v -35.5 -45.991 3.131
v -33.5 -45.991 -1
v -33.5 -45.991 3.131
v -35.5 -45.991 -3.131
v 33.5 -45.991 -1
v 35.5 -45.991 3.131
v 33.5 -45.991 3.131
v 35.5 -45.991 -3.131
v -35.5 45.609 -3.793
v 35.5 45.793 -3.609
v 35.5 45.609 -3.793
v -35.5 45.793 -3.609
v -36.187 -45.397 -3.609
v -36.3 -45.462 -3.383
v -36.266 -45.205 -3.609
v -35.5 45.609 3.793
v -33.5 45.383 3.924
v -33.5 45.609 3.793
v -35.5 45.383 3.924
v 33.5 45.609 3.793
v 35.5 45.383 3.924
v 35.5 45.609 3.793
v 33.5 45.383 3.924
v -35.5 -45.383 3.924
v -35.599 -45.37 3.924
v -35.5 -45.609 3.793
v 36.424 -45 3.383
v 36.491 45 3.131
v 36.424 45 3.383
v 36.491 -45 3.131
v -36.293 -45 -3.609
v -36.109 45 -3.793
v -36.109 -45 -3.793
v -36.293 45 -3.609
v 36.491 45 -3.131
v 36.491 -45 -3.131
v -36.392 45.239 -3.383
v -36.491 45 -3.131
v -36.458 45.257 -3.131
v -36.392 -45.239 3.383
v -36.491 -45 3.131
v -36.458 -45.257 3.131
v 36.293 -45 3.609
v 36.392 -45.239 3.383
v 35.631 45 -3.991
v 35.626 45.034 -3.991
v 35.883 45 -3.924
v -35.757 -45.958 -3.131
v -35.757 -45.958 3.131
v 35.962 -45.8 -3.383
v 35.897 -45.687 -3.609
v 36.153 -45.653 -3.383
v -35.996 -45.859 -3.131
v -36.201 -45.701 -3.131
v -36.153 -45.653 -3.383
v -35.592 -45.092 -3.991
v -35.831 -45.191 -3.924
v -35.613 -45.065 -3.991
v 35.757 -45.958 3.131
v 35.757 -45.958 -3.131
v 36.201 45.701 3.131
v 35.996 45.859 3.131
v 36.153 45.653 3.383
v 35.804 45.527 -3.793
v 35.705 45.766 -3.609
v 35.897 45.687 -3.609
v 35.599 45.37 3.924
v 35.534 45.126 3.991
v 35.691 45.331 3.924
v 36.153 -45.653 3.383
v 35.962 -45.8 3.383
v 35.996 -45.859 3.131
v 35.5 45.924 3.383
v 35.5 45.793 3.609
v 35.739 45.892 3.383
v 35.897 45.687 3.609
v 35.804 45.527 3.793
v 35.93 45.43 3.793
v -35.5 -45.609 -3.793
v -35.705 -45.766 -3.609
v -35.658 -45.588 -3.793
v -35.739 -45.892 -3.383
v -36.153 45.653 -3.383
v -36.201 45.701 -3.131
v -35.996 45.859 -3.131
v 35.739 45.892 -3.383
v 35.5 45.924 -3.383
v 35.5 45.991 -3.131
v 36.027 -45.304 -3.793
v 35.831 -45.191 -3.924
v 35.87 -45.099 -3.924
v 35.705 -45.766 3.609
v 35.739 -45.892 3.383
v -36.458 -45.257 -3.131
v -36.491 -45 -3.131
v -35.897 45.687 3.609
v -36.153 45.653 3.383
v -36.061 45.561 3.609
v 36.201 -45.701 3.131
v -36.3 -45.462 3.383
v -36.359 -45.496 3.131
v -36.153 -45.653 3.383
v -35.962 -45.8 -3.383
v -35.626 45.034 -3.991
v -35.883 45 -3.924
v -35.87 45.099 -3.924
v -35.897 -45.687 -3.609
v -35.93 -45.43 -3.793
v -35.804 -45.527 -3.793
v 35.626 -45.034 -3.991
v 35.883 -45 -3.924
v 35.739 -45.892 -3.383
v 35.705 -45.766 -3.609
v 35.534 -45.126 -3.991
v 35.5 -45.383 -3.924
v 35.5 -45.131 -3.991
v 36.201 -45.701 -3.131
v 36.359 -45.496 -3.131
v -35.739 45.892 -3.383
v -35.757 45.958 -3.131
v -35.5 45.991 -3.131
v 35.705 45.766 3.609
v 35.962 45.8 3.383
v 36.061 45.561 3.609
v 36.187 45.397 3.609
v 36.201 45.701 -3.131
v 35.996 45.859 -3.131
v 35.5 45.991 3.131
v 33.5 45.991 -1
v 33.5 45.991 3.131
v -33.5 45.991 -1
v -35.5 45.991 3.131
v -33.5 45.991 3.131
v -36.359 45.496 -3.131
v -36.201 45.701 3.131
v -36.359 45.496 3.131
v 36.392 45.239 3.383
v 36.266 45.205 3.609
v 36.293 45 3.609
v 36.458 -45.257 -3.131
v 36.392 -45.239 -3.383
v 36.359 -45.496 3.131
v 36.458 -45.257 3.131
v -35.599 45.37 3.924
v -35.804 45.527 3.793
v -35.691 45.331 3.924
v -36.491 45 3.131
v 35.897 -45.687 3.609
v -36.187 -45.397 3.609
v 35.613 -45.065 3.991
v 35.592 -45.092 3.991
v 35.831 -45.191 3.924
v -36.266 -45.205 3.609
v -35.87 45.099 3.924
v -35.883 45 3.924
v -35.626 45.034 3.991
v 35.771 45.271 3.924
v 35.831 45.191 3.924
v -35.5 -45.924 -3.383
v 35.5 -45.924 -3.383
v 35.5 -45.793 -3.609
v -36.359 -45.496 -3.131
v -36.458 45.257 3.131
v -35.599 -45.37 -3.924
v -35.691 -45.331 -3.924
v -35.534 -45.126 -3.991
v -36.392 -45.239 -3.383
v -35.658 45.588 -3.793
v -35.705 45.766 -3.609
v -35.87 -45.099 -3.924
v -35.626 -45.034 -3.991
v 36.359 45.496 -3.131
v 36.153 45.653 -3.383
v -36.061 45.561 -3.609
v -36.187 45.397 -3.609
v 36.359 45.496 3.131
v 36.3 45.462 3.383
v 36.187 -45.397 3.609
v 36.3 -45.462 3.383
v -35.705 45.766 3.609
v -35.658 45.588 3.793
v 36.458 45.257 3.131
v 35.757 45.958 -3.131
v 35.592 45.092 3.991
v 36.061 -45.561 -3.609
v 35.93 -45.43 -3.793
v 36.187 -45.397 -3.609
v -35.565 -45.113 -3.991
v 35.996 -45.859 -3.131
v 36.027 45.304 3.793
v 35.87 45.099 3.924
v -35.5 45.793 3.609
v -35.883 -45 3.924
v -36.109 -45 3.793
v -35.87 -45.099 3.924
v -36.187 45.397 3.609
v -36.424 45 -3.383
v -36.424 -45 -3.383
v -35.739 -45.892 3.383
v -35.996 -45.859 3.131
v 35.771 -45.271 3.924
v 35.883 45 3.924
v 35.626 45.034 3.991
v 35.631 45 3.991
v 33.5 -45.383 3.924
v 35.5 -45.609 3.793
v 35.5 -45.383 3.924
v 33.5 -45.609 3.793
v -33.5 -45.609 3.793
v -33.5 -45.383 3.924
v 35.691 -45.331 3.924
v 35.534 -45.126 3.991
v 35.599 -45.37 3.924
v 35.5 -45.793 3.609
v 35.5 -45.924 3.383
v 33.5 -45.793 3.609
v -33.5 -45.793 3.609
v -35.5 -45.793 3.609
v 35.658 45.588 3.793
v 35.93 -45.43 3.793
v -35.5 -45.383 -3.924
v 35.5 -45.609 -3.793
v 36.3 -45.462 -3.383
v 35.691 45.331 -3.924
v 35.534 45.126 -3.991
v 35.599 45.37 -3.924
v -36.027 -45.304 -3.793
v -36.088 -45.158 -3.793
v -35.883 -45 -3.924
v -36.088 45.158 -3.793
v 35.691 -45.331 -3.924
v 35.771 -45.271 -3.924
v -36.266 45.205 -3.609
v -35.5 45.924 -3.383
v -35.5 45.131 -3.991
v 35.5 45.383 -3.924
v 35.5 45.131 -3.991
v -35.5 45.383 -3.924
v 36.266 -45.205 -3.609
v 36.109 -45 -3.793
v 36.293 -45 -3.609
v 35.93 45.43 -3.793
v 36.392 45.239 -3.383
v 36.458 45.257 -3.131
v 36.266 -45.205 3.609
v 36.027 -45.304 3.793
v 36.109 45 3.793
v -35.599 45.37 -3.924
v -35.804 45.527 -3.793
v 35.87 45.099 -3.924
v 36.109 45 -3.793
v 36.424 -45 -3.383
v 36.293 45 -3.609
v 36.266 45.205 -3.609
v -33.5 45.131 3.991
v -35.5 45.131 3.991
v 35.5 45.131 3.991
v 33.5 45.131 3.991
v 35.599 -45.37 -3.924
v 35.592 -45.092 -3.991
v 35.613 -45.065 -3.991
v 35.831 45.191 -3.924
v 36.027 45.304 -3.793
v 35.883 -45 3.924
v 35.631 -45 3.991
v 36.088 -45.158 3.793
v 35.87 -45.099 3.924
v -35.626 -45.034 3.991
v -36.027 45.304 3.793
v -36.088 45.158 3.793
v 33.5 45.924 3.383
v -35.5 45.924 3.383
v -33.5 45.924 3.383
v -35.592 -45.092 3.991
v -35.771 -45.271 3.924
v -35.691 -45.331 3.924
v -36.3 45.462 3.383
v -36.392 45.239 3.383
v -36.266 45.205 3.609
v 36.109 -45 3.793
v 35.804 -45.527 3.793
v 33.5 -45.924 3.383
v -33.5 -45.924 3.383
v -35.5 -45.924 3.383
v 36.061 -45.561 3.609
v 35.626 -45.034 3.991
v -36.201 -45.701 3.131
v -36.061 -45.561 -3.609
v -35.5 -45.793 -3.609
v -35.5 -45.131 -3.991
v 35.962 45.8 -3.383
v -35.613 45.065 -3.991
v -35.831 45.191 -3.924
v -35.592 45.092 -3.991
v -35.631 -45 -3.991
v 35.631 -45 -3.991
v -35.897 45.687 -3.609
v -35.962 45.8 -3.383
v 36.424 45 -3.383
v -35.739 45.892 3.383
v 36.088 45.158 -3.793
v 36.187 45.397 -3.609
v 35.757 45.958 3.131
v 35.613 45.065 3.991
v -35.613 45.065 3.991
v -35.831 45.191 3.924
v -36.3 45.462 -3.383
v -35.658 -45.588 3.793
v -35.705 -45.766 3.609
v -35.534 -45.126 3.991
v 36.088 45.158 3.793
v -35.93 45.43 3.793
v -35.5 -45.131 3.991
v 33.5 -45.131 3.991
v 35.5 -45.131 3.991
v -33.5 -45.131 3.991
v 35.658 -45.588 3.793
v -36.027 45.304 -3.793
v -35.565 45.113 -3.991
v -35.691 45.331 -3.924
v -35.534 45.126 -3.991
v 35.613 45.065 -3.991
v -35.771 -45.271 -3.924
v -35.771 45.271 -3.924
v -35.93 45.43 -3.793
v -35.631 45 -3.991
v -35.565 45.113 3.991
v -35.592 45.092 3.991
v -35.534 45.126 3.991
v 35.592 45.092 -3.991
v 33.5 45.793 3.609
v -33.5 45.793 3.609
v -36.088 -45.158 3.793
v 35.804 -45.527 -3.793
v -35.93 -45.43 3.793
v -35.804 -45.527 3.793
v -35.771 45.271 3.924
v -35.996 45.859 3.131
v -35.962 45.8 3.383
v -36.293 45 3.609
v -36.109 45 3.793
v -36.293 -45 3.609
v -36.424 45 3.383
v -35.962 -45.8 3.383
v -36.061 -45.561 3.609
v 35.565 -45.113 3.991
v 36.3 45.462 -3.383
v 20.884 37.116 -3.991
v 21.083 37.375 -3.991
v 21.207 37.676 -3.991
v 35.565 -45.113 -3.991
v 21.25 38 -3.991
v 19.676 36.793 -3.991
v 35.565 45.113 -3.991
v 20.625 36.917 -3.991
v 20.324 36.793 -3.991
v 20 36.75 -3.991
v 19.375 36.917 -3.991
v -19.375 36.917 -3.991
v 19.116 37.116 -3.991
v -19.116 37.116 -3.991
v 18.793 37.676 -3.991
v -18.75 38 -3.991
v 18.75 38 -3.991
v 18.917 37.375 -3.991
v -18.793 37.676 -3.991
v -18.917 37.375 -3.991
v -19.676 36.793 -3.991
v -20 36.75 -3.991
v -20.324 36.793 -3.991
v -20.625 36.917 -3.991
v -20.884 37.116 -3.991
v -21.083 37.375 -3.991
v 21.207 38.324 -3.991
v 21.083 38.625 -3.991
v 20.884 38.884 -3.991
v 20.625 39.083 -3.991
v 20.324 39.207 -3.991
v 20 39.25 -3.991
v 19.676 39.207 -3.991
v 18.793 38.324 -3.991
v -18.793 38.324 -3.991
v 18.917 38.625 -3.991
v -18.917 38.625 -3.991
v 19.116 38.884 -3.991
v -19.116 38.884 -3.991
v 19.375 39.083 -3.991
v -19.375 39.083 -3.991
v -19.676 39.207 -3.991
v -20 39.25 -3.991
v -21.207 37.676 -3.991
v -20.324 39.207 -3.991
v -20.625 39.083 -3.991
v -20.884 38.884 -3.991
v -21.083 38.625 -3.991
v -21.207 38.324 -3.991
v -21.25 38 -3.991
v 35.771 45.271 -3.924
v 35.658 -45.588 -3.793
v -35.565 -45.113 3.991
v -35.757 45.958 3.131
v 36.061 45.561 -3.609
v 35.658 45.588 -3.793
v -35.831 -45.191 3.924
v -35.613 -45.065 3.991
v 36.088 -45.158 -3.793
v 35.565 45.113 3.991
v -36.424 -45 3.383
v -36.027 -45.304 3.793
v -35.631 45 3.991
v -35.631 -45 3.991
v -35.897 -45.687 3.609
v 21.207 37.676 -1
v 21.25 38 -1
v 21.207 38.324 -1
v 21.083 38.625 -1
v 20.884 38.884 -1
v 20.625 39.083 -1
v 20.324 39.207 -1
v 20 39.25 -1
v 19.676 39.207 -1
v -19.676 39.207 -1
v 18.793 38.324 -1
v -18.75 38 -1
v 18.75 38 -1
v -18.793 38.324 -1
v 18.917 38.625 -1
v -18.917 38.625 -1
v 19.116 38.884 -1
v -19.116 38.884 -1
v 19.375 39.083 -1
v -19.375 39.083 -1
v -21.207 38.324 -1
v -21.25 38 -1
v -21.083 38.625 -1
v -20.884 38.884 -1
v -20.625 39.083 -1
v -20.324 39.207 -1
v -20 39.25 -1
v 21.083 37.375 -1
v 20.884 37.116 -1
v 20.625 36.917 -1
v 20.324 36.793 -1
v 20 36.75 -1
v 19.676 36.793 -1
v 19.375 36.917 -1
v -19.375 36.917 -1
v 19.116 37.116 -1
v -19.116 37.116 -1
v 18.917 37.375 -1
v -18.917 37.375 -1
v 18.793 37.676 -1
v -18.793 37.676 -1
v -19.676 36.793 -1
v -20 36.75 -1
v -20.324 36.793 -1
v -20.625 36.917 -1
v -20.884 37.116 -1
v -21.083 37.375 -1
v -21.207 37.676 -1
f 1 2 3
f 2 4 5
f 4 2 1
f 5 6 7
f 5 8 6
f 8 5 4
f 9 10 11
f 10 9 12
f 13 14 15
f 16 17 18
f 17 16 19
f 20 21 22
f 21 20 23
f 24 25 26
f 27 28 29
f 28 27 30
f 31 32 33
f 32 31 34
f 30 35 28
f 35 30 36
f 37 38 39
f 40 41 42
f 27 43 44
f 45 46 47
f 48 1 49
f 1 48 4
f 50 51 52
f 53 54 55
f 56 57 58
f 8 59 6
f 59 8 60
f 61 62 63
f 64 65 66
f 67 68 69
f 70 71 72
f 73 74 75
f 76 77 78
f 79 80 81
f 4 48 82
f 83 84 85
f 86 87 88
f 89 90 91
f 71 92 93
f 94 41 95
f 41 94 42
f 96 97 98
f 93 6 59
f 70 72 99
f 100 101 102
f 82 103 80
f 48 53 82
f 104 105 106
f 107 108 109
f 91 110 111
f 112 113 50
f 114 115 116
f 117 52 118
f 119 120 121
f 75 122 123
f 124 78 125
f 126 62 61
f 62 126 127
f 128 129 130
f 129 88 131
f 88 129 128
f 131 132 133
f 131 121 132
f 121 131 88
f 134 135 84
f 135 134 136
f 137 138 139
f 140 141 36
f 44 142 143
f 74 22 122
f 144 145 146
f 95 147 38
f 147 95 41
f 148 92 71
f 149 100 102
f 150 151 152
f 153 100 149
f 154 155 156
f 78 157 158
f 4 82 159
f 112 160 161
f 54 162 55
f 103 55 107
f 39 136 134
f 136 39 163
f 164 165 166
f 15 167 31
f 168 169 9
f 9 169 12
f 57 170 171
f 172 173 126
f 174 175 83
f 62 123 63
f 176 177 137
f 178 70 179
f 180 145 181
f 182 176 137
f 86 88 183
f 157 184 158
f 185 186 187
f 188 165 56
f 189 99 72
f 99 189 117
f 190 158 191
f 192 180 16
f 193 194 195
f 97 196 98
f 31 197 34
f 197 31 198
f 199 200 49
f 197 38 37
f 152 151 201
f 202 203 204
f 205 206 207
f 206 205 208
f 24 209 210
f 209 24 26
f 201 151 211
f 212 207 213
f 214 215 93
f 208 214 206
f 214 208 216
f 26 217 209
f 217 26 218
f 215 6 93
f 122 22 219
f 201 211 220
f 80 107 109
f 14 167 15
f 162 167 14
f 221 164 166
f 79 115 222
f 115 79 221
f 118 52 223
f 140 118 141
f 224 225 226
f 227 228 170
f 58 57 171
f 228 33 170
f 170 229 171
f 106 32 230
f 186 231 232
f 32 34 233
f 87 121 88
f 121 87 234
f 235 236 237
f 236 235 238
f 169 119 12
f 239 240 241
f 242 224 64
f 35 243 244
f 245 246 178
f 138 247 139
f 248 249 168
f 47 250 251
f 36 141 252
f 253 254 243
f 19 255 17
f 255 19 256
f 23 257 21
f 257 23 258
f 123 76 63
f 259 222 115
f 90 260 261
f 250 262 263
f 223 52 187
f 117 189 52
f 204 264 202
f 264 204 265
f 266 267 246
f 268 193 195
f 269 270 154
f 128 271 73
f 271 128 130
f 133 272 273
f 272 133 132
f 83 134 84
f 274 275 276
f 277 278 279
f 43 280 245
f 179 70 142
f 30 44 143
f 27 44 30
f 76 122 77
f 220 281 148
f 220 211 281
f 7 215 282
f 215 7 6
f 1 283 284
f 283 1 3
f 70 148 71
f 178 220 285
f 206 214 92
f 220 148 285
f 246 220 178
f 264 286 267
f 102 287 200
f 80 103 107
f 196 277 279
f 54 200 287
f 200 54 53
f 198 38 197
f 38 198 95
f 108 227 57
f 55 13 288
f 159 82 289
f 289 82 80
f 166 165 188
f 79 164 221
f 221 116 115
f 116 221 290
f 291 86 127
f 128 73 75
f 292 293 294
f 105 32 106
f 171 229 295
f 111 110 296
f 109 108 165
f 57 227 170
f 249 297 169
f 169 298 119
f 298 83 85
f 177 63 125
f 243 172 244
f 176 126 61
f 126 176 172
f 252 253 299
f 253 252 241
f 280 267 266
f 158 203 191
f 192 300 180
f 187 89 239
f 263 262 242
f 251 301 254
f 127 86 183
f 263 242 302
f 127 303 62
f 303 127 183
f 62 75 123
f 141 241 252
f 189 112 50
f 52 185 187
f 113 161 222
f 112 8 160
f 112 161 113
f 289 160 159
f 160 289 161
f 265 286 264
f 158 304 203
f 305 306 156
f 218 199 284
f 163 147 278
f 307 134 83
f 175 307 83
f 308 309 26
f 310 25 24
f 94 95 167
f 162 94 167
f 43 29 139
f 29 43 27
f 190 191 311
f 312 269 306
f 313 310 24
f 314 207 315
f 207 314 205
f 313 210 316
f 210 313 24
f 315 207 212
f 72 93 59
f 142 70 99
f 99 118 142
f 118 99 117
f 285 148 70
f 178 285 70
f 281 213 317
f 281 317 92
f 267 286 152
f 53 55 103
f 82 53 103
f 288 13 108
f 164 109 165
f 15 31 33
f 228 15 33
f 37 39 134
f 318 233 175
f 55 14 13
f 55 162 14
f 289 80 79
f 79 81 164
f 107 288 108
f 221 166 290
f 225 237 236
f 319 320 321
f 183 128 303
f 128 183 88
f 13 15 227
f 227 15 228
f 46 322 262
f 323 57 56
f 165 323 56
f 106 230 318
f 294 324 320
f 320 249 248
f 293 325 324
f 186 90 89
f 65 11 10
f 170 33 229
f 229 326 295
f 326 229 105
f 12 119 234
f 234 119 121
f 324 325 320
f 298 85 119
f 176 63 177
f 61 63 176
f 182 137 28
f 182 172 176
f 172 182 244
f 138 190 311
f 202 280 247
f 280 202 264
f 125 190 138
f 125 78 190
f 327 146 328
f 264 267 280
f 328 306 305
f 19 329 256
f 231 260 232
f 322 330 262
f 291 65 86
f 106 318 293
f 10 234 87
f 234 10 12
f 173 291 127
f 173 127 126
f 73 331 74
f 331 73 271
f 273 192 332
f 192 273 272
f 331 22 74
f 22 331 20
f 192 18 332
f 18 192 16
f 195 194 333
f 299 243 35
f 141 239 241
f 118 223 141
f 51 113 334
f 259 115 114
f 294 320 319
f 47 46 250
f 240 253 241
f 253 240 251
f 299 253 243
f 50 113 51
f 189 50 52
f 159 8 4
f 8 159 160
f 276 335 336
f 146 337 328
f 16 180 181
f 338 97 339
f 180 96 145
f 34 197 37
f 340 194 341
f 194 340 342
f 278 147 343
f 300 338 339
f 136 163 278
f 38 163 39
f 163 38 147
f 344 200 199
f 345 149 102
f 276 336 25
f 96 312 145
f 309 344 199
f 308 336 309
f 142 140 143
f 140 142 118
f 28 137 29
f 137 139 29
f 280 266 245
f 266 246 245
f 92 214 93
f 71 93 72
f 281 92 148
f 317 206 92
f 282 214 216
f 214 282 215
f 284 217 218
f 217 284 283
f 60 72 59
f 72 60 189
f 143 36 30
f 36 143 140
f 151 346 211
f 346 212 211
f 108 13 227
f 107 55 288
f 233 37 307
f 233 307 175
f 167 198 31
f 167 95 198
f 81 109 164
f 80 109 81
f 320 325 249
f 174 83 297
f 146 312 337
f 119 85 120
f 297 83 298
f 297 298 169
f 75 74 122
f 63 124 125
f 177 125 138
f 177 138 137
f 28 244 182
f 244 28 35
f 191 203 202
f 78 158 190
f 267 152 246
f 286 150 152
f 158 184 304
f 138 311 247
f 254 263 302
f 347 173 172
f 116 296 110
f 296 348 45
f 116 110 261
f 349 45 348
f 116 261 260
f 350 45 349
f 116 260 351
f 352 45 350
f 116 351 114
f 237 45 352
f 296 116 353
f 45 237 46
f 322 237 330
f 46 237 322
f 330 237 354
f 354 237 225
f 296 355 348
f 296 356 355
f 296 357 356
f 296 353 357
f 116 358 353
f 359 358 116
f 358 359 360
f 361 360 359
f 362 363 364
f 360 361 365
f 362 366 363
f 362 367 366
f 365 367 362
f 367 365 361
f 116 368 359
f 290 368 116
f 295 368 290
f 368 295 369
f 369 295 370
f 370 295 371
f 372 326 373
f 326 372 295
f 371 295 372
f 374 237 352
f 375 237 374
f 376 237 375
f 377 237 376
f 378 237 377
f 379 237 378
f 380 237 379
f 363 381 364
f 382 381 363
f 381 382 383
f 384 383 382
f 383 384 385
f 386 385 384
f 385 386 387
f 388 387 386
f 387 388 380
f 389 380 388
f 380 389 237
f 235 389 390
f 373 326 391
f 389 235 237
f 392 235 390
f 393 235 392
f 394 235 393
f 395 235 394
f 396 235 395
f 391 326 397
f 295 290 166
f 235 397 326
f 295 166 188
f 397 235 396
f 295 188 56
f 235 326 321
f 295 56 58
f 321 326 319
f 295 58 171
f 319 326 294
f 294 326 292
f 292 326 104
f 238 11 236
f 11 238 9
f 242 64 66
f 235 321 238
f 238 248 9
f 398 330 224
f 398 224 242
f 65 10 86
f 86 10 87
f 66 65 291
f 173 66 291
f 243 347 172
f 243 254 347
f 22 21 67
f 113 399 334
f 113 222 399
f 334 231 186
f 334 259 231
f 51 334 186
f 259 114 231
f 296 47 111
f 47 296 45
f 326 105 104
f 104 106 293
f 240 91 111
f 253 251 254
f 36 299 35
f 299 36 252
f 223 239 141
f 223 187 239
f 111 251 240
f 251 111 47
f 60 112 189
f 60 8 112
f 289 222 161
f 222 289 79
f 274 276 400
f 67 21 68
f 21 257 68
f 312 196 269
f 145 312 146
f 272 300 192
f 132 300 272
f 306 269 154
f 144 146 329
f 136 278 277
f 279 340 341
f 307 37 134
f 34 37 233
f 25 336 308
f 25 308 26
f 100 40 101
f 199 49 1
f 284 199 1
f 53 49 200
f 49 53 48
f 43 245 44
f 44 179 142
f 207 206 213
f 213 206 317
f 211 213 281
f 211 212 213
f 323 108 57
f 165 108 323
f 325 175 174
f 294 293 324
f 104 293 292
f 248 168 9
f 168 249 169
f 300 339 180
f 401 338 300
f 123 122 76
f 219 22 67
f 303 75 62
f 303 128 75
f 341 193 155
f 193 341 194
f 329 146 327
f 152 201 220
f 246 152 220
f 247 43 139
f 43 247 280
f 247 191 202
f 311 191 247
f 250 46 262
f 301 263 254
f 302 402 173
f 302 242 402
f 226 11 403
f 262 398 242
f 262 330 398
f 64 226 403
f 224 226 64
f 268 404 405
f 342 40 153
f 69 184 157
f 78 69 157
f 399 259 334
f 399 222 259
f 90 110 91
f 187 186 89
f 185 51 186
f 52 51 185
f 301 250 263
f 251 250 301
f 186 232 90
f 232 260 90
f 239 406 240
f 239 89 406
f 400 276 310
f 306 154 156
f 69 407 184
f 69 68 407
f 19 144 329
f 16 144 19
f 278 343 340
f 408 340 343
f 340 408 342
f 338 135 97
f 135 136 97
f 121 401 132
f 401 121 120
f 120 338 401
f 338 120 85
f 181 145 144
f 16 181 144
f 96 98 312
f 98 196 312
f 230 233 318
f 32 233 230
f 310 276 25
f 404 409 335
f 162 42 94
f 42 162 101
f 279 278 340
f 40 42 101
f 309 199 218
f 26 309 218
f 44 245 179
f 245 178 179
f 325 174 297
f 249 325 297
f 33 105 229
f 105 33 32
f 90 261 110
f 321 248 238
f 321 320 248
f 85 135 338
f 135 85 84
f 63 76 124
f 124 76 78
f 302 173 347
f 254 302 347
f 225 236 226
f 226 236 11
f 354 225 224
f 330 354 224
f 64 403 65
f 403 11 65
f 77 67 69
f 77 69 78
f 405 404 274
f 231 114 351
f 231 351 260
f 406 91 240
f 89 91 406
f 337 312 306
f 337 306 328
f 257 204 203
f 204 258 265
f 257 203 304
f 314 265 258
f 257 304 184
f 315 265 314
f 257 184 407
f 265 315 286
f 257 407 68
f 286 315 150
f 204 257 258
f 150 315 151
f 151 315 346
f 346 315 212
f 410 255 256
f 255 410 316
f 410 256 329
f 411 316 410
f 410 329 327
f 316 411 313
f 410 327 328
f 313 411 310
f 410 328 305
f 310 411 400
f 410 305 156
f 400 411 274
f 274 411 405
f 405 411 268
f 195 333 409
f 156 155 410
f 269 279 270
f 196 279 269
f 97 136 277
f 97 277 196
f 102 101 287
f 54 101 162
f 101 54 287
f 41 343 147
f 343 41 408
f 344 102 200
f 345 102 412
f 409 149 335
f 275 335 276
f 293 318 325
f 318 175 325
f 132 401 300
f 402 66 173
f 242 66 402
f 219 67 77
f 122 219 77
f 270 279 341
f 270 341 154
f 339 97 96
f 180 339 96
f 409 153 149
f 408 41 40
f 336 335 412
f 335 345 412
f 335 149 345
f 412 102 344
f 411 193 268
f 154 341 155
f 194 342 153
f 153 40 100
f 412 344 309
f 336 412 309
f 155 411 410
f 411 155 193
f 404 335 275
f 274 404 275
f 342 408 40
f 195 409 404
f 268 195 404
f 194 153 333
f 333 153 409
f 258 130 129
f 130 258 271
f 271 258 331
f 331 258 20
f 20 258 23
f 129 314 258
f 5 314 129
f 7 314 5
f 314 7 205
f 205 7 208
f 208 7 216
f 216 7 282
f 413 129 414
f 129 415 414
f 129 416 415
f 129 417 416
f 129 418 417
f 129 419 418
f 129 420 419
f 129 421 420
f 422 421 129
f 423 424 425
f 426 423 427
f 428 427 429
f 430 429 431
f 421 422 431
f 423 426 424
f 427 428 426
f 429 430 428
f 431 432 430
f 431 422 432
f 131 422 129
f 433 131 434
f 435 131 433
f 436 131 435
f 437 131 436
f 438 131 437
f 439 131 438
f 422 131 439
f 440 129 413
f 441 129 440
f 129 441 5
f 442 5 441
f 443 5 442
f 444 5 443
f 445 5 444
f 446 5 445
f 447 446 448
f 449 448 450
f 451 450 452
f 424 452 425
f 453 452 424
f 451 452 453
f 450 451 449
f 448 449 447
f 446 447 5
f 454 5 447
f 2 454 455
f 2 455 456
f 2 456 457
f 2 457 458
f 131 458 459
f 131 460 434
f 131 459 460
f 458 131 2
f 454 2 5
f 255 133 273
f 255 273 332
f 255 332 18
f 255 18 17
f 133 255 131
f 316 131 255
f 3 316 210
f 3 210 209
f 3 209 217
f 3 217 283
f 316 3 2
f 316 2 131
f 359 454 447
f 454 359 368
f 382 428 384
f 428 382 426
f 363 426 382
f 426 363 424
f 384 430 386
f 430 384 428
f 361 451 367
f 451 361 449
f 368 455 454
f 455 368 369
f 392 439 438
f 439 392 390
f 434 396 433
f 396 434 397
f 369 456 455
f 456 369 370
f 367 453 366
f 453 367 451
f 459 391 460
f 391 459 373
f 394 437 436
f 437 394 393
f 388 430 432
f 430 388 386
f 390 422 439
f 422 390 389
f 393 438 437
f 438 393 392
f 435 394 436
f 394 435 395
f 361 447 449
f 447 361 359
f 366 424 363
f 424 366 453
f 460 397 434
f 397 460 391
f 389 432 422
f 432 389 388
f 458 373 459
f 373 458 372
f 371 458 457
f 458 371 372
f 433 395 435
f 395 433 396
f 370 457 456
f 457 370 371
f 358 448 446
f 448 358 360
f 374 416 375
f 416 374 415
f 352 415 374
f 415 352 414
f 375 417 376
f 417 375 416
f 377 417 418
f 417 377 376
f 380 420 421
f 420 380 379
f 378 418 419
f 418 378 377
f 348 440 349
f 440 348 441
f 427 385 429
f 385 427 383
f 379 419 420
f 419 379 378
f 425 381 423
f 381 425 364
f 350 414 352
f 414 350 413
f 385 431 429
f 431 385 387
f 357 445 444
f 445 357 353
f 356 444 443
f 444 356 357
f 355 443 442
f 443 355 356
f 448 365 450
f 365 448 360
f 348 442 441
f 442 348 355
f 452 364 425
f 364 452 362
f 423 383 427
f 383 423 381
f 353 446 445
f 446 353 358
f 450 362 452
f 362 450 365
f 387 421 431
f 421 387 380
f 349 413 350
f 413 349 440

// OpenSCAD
length = 90;
width = 67;
thickness = 6;
wall = 2;
ring_dist = 40;
ring_edge = 7;
ring_thickness = 2.5;
round = 1;
$fn = 24;

difference() {
  minkowski() {
    cube([width + 2 * wall, length, thickness], true);
    sphere(1);
  }

  translate([0, 0, wall]) {
    cube([width, length + 2 * round + 2 * wall, thickness], true);
  }

  translate([ring_dist / -2, length / 2 - ring_edge, 0]) {
    cylinder(h = thickness + 2 * round, d = ring_thickness,center = true);
  }

  translate([ring_dist / 2, length / 2 - ring_edge, 0]) {
    cylinder(h = thickness + 2 + round, d = ring_thickness, center=true);
  }

}
